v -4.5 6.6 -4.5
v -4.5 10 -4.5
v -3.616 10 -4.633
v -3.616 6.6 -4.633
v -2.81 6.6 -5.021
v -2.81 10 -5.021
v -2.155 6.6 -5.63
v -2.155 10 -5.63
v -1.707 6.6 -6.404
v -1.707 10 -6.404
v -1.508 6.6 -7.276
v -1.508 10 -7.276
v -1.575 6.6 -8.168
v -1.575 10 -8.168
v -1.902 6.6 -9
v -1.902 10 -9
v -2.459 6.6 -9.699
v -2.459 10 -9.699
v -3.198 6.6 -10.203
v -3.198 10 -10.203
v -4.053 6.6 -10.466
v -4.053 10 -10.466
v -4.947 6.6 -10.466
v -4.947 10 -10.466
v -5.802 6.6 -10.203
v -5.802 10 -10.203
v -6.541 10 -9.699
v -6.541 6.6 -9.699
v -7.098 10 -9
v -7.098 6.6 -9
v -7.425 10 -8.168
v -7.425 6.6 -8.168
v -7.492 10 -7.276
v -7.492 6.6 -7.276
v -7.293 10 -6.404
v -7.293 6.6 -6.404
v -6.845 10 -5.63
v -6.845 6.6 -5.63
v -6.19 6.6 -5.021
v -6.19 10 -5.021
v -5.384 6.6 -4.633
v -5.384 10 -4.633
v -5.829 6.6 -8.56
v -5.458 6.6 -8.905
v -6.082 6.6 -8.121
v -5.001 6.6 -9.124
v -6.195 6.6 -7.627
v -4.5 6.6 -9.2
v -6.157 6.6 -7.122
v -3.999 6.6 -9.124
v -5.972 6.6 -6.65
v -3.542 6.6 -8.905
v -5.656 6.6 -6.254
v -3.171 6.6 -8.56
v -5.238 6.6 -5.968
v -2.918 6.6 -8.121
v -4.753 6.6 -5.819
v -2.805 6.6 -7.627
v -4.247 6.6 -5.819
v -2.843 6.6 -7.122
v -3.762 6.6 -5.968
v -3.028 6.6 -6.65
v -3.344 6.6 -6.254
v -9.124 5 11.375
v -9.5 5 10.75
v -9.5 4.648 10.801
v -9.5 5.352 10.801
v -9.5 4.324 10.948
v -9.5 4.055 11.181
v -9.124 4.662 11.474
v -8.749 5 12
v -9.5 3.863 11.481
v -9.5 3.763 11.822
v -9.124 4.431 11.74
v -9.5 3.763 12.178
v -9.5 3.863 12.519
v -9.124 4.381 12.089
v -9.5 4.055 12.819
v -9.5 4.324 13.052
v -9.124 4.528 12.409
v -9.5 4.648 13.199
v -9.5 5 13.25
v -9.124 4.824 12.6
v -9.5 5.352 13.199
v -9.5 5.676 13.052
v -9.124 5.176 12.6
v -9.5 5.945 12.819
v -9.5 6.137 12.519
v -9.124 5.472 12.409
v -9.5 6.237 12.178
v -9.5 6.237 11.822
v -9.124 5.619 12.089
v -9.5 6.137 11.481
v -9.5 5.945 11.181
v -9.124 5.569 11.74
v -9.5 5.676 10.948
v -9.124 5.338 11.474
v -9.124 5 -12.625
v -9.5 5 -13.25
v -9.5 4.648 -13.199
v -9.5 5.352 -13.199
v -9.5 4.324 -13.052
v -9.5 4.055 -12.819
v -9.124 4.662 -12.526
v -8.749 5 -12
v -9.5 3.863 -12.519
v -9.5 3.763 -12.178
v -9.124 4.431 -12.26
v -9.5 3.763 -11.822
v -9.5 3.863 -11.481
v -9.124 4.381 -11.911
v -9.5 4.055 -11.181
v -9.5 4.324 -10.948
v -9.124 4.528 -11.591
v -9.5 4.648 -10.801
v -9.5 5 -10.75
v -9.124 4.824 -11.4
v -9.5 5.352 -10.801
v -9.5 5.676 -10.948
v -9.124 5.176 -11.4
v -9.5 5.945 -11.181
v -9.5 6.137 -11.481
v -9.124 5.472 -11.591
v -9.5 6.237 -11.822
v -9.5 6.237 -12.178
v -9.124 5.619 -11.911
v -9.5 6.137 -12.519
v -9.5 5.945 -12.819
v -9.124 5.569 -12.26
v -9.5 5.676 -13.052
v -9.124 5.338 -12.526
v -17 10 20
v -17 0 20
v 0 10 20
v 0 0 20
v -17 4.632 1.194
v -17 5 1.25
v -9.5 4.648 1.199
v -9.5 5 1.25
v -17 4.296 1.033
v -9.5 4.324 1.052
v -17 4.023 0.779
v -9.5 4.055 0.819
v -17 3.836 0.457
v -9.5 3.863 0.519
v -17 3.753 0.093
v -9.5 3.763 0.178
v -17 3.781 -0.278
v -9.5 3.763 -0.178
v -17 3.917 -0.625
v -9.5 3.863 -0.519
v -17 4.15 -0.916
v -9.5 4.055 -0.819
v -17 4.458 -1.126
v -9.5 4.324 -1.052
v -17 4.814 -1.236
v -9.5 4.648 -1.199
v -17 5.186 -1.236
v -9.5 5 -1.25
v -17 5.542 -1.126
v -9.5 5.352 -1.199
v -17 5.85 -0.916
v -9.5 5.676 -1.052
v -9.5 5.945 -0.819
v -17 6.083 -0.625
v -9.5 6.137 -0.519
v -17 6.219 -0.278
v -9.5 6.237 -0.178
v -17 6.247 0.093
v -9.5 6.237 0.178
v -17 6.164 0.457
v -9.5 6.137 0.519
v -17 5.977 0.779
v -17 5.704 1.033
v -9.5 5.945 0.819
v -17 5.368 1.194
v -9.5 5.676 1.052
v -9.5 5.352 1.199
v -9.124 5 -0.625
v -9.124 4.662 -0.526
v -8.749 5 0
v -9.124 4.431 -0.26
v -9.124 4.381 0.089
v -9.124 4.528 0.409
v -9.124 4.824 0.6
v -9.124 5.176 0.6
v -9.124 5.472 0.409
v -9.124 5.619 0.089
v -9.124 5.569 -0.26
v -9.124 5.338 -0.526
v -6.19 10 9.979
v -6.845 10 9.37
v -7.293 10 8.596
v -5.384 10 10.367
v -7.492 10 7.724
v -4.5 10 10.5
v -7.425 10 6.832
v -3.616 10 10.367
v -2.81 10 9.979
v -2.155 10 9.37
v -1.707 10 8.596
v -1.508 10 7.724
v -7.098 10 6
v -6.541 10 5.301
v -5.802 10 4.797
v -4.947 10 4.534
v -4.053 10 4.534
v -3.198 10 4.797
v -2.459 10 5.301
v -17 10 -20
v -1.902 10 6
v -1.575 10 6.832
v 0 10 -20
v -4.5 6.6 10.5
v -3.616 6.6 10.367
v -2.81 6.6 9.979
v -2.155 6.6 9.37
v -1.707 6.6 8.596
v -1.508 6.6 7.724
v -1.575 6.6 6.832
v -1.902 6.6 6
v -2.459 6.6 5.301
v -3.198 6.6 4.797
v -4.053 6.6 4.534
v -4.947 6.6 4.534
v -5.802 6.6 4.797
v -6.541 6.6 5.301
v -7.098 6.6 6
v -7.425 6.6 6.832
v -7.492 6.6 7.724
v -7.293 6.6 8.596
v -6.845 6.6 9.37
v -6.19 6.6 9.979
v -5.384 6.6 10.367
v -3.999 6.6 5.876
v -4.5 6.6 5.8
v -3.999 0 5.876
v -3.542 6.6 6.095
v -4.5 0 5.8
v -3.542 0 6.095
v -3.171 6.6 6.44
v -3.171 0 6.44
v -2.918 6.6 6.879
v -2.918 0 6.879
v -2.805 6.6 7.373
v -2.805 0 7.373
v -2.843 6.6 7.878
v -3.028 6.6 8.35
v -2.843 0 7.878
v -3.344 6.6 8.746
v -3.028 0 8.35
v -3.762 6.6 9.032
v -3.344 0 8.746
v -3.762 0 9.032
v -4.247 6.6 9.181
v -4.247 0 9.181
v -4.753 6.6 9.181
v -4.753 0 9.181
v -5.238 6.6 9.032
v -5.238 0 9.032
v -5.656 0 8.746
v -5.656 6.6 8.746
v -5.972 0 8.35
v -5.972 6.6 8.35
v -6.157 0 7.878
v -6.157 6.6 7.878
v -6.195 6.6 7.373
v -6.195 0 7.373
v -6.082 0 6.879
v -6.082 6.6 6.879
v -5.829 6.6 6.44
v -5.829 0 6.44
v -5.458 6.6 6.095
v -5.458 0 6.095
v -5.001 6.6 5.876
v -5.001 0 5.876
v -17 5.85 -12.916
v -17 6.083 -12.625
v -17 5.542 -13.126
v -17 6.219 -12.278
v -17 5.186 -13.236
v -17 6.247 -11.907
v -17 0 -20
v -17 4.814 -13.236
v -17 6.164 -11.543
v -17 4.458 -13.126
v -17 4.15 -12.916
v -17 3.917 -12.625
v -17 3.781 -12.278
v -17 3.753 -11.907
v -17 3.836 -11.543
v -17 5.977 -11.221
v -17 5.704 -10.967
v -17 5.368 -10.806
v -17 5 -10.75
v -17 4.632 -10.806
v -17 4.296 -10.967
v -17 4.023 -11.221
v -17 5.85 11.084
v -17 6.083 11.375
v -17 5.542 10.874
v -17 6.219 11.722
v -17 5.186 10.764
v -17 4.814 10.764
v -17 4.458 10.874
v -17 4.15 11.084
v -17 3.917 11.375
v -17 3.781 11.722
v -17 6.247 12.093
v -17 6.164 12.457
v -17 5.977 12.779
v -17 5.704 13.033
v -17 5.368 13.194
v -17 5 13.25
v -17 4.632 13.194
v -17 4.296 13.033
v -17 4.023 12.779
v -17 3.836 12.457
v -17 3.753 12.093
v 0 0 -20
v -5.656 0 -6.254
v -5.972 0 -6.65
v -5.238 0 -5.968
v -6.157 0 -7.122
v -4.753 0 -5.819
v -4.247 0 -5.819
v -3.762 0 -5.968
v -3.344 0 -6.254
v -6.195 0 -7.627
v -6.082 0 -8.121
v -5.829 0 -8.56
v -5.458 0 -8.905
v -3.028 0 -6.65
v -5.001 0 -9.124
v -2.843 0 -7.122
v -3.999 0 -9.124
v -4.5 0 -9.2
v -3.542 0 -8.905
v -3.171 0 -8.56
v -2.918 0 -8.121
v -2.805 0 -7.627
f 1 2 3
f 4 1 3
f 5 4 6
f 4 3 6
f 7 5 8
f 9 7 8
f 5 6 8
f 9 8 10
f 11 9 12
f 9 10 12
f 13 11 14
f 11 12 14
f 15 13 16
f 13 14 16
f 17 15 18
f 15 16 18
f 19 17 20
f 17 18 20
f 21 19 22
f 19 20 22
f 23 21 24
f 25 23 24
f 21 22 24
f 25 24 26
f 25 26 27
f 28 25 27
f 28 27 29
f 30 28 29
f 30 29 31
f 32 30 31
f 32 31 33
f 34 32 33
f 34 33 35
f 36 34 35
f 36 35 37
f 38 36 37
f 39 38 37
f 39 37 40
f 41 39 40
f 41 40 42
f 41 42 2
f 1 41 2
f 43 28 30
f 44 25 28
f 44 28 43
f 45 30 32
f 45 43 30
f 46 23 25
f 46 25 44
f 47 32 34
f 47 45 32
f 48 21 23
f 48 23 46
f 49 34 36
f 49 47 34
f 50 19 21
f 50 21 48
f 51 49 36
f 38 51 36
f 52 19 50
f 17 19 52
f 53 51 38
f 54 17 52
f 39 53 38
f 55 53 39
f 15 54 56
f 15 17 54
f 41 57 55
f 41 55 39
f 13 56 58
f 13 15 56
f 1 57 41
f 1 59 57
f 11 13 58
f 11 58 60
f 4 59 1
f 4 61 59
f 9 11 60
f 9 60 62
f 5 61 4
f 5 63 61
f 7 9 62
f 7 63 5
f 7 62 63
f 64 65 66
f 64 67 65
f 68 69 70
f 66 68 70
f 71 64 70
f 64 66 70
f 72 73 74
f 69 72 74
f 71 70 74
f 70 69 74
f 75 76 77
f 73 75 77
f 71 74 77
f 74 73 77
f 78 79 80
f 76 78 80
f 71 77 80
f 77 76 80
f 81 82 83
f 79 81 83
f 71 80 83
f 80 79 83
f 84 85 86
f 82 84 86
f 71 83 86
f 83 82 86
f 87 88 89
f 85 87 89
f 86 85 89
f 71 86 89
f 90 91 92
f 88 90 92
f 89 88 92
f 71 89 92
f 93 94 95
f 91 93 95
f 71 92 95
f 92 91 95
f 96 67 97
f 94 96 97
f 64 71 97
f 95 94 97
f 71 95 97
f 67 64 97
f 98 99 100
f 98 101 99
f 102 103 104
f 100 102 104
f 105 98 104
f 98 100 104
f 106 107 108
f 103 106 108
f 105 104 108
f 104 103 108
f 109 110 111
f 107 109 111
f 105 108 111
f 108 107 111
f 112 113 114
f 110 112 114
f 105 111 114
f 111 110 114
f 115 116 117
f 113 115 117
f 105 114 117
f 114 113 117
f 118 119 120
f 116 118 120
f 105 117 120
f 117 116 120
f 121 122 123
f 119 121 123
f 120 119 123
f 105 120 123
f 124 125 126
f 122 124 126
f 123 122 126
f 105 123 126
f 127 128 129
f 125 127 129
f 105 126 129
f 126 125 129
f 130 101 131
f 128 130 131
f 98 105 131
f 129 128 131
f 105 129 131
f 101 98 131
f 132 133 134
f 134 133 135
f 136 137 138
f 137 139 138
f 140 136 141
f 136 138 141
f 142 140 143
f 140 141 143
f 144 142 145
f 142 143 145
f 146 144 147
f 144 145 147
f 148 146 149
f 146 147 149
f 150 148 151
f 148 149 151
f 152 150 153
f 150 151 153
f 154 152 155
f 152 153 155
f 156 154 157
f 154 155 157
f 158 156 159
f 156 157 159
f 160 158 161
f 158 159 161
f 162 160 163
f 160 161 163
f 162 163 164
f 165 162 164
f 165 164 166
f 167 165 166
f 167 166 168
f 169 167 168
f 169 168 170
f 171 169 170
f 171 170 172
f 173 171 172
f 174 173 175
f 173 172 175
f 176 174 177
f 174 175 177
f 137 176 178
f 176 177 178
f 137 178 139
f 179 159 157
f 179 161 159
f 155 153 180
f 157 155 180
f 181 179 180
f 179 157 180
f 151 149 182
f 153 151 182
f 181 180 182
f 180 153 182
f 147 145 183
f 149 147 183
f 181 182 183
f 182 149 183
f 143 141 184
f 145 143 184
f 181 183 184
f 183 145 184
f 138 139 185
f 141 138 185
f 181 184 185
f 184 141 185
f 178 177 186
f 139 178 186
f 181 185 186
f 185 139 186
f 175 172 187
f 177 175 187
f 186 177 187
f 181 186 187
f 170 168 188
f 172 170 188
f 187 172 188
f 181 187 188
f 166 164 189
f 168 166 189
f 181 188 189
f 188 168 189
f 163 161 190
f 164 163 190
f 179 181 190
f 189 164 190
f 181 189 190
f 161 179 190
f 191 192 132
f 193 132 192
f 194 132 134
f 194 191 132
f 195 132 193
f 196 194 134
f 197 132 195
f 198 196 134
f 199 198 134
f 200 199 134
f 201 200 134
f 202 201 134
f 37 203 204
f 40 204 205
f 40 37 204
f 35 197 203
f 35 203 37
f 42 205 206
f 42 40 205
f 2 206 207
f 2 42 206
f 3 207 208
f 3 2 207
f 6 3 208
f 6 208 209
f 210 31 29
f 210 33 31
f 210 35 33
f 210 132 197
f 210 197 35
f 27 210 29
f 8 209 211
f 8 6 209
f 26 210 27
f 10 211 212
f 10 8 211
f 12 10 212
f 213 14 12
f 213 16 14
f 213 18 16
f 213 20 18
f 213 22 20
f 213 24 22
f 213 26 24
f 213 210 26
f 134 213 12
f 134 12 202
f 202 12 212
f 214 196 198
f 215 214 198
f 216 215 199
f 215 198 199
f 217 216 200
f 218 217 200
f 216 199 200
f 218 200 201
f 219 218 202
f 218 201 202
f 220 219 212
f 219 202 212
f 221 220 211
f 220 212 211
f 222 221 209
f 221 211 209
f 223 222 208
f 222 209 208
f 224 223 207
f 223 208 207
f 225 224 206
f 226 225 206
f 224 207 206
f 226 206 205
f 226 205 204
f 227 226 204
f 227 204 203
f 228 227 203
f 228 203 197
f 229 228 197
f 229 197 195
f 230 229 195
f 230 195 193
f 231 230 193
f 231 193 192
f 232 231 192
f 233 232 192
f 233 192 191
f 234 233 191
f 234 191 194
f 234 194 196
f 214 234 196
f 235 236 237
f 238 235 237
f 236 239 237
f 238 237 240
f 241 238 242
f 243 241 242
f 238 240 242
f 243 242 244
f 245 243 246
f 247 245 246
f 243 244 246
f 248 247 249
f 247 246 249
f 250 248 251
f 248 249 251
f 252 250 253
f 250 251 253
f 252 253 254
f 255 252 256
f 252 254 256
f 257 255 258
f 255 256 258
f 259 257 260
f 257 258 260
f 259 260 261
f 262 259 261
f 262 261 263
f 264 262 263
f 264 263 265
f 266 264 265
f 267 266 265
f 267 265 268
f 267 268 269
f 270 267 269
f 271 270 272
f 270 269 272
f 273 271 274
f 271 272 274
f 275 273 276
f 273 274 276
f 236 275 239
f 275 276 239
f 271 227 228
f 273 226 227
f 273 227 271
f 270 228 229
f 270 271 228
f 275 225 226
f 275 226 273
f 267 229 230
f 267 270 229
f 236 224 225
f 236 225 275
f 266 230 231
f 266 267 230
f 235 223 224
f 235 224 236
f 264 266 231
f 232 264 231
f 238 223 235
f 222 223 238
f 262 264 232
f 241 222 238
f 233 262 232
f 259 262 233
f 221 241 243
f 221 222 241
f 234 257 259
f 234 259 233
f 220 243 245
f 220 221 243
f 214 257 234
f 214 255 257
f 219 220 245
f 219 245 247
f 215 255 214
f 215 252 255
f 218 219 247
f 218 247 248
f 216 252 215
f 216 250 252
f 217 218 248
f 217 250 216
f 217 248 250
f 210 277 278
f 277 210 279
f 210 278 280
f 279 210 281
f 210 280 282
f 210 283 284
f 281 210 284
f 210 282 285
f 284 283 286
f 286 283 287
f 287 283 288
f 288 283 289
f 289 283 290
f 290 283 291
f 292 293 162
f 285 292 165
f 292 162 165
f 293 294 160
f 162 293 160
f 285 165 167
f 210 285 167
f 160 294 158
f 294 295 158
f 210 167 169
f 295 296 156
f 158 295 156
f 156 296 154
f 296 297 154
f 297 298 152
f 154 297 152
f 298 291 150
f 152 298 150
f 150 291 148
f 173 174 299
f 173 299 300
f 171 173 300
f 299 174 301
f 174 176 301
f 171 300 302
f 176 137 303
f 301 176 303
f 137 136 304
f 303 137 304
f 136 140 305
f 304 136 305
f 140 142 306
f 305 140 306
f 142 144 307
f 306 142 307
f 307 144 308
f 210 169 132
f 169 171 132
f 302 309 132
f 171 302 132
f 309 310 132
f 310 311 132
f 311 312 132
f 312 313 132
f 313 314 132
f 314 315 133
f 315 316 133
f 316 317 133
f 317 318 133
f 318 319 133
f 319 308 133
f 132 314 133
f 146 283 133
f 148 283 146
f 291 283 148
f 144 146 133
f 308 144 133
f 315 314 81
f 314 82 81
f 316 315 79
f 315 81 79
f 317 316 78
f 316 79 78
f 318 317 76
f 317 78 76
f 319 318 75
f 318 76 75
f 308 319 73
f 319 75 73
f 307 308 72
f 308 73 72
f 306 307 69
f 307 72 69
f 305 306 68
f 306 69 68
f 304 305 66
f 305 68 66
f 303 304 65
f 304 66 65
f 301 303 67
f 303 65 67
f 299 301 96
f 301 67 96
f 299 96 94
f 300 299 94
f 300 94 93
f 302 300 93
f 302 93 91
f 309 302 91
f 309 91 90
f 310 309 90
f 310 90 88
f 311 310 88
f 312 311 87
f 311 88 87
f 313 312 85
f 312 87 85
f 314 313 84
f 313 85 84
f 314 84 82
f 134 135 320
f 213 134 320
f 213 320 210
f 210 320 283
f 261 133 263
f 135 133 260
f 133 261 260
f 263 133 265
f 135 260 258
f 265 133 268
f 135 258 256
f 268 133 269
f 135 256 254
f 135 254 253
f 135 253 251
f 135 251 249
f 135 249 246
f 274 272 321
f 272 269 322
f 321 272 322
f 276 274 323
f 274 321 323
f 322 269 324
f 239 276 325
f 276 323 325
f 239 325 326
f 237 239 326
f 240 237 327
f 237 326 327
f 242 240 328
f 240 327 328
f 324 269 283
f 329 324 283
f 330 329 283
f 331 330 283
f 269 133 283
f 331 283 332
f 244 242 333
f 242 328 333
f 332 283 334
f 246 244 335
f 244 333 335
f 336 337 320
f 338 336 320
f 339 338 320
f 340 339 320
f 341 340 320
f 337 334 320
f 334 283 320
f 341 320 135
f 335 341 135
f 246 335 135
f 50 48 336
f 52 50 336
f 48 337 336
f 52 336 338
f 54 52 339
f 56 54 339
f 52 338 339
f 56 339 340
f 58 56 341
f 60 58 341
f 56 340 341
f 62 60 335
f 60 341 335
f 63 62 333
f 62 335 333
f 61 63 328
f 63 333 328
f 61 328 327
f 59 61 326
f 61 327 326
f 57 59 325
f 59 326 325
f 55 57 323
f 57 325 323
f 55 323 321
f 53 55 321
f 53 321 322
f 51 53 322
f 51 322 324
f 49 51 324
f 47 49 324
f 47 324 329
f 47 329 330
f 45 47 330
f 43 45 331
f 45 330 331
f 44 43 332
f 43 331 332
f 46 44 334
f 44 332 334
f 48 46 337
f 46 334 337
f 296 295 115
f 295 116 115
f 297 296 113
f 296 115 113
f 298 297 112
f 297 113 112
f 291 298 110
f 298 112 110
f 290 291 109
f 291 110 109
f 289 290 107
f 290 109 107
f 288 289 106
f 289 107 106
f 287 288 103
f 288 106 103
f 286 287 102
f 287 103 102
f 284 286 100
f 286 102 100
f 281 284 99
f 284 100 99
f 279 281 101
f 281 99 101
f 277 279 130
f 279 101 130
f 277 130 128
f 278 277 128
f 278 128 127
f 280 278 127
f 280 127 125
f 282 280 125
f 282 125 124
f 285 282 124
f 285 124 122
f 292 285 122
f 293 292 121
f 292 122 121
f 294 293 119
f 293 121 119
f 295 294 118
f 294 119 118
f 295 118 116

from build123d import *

# Parameters (mm, degrees)
EXTRUDE_1_DEPTH           = 10
HOLE_WIZARD_1_D           = 3.4
HOLE_WIZARD_1_CBORE_D     = 6
HOLE_WIZARD_1_CBORE_DEPTH = 3.4
HOLE_WIZARD_M3_2_D        = 2.5
HOLE_WIZARD_M3_2_DEPTH    = 7.5
HOLE_WIZARD_M3_2_TIP      = 0.751075774


with BuildPart() as part:
    # 草图1 → 凸台-拉伸1 (new body)
    with BuildSketch(Plane(origin=(0, 0, 0), x_dir=(1, 0, 0), z_dir=(0, 1, 0))):
        Polygon((0, 0), (0, 20), (-17, 20), (-17, -20), (0, -20), align=None)
    extrude(amount=EXTRUDE_1_DEPTH)

    # 打孔尺寸(%根据)内六角圆柱头螺钉的类型1 (through all)
    with Locations(Plane(origin=(-4.5, 10, -7.5), x_dir=(0, 0, 1), z_dir=(0, 1, 0))):
        with Locations((0, 0), (15, 0)):
            CounterBoreHole(HOLE_WIZARD_1_D / 2, HOLE_WIZARD_1_CBORE_D / 2, HOLE_WIZARD_1_CBORE_DEPTH)

    # M3 螺纹孔2
    with Locations(Plane(origin=(-17, 5, -12), x_dir=(0, 0, -1), z_dir=(-1, 0, 0))):
        with Locations((0, 0), (-12, 0), (-24, 0)):
            Hole(HOLE_WIZARD_M3_2_D / 2, depth=HOLE_WIZARD_M3_2_DEPTH)
            with Locations((0, 0, -(HOLE_WIZARD_M3_2_DEPTH + HOLE_WIZARD_M3_2_TIP / 2))):  # 118° drill point
                Cone(0, HOLE_WIZARD_M3_2_D / 2, HOLE_WIZARD_M3_2_TIP, mode=Mode.SUBTRACT)


solid = part.part
